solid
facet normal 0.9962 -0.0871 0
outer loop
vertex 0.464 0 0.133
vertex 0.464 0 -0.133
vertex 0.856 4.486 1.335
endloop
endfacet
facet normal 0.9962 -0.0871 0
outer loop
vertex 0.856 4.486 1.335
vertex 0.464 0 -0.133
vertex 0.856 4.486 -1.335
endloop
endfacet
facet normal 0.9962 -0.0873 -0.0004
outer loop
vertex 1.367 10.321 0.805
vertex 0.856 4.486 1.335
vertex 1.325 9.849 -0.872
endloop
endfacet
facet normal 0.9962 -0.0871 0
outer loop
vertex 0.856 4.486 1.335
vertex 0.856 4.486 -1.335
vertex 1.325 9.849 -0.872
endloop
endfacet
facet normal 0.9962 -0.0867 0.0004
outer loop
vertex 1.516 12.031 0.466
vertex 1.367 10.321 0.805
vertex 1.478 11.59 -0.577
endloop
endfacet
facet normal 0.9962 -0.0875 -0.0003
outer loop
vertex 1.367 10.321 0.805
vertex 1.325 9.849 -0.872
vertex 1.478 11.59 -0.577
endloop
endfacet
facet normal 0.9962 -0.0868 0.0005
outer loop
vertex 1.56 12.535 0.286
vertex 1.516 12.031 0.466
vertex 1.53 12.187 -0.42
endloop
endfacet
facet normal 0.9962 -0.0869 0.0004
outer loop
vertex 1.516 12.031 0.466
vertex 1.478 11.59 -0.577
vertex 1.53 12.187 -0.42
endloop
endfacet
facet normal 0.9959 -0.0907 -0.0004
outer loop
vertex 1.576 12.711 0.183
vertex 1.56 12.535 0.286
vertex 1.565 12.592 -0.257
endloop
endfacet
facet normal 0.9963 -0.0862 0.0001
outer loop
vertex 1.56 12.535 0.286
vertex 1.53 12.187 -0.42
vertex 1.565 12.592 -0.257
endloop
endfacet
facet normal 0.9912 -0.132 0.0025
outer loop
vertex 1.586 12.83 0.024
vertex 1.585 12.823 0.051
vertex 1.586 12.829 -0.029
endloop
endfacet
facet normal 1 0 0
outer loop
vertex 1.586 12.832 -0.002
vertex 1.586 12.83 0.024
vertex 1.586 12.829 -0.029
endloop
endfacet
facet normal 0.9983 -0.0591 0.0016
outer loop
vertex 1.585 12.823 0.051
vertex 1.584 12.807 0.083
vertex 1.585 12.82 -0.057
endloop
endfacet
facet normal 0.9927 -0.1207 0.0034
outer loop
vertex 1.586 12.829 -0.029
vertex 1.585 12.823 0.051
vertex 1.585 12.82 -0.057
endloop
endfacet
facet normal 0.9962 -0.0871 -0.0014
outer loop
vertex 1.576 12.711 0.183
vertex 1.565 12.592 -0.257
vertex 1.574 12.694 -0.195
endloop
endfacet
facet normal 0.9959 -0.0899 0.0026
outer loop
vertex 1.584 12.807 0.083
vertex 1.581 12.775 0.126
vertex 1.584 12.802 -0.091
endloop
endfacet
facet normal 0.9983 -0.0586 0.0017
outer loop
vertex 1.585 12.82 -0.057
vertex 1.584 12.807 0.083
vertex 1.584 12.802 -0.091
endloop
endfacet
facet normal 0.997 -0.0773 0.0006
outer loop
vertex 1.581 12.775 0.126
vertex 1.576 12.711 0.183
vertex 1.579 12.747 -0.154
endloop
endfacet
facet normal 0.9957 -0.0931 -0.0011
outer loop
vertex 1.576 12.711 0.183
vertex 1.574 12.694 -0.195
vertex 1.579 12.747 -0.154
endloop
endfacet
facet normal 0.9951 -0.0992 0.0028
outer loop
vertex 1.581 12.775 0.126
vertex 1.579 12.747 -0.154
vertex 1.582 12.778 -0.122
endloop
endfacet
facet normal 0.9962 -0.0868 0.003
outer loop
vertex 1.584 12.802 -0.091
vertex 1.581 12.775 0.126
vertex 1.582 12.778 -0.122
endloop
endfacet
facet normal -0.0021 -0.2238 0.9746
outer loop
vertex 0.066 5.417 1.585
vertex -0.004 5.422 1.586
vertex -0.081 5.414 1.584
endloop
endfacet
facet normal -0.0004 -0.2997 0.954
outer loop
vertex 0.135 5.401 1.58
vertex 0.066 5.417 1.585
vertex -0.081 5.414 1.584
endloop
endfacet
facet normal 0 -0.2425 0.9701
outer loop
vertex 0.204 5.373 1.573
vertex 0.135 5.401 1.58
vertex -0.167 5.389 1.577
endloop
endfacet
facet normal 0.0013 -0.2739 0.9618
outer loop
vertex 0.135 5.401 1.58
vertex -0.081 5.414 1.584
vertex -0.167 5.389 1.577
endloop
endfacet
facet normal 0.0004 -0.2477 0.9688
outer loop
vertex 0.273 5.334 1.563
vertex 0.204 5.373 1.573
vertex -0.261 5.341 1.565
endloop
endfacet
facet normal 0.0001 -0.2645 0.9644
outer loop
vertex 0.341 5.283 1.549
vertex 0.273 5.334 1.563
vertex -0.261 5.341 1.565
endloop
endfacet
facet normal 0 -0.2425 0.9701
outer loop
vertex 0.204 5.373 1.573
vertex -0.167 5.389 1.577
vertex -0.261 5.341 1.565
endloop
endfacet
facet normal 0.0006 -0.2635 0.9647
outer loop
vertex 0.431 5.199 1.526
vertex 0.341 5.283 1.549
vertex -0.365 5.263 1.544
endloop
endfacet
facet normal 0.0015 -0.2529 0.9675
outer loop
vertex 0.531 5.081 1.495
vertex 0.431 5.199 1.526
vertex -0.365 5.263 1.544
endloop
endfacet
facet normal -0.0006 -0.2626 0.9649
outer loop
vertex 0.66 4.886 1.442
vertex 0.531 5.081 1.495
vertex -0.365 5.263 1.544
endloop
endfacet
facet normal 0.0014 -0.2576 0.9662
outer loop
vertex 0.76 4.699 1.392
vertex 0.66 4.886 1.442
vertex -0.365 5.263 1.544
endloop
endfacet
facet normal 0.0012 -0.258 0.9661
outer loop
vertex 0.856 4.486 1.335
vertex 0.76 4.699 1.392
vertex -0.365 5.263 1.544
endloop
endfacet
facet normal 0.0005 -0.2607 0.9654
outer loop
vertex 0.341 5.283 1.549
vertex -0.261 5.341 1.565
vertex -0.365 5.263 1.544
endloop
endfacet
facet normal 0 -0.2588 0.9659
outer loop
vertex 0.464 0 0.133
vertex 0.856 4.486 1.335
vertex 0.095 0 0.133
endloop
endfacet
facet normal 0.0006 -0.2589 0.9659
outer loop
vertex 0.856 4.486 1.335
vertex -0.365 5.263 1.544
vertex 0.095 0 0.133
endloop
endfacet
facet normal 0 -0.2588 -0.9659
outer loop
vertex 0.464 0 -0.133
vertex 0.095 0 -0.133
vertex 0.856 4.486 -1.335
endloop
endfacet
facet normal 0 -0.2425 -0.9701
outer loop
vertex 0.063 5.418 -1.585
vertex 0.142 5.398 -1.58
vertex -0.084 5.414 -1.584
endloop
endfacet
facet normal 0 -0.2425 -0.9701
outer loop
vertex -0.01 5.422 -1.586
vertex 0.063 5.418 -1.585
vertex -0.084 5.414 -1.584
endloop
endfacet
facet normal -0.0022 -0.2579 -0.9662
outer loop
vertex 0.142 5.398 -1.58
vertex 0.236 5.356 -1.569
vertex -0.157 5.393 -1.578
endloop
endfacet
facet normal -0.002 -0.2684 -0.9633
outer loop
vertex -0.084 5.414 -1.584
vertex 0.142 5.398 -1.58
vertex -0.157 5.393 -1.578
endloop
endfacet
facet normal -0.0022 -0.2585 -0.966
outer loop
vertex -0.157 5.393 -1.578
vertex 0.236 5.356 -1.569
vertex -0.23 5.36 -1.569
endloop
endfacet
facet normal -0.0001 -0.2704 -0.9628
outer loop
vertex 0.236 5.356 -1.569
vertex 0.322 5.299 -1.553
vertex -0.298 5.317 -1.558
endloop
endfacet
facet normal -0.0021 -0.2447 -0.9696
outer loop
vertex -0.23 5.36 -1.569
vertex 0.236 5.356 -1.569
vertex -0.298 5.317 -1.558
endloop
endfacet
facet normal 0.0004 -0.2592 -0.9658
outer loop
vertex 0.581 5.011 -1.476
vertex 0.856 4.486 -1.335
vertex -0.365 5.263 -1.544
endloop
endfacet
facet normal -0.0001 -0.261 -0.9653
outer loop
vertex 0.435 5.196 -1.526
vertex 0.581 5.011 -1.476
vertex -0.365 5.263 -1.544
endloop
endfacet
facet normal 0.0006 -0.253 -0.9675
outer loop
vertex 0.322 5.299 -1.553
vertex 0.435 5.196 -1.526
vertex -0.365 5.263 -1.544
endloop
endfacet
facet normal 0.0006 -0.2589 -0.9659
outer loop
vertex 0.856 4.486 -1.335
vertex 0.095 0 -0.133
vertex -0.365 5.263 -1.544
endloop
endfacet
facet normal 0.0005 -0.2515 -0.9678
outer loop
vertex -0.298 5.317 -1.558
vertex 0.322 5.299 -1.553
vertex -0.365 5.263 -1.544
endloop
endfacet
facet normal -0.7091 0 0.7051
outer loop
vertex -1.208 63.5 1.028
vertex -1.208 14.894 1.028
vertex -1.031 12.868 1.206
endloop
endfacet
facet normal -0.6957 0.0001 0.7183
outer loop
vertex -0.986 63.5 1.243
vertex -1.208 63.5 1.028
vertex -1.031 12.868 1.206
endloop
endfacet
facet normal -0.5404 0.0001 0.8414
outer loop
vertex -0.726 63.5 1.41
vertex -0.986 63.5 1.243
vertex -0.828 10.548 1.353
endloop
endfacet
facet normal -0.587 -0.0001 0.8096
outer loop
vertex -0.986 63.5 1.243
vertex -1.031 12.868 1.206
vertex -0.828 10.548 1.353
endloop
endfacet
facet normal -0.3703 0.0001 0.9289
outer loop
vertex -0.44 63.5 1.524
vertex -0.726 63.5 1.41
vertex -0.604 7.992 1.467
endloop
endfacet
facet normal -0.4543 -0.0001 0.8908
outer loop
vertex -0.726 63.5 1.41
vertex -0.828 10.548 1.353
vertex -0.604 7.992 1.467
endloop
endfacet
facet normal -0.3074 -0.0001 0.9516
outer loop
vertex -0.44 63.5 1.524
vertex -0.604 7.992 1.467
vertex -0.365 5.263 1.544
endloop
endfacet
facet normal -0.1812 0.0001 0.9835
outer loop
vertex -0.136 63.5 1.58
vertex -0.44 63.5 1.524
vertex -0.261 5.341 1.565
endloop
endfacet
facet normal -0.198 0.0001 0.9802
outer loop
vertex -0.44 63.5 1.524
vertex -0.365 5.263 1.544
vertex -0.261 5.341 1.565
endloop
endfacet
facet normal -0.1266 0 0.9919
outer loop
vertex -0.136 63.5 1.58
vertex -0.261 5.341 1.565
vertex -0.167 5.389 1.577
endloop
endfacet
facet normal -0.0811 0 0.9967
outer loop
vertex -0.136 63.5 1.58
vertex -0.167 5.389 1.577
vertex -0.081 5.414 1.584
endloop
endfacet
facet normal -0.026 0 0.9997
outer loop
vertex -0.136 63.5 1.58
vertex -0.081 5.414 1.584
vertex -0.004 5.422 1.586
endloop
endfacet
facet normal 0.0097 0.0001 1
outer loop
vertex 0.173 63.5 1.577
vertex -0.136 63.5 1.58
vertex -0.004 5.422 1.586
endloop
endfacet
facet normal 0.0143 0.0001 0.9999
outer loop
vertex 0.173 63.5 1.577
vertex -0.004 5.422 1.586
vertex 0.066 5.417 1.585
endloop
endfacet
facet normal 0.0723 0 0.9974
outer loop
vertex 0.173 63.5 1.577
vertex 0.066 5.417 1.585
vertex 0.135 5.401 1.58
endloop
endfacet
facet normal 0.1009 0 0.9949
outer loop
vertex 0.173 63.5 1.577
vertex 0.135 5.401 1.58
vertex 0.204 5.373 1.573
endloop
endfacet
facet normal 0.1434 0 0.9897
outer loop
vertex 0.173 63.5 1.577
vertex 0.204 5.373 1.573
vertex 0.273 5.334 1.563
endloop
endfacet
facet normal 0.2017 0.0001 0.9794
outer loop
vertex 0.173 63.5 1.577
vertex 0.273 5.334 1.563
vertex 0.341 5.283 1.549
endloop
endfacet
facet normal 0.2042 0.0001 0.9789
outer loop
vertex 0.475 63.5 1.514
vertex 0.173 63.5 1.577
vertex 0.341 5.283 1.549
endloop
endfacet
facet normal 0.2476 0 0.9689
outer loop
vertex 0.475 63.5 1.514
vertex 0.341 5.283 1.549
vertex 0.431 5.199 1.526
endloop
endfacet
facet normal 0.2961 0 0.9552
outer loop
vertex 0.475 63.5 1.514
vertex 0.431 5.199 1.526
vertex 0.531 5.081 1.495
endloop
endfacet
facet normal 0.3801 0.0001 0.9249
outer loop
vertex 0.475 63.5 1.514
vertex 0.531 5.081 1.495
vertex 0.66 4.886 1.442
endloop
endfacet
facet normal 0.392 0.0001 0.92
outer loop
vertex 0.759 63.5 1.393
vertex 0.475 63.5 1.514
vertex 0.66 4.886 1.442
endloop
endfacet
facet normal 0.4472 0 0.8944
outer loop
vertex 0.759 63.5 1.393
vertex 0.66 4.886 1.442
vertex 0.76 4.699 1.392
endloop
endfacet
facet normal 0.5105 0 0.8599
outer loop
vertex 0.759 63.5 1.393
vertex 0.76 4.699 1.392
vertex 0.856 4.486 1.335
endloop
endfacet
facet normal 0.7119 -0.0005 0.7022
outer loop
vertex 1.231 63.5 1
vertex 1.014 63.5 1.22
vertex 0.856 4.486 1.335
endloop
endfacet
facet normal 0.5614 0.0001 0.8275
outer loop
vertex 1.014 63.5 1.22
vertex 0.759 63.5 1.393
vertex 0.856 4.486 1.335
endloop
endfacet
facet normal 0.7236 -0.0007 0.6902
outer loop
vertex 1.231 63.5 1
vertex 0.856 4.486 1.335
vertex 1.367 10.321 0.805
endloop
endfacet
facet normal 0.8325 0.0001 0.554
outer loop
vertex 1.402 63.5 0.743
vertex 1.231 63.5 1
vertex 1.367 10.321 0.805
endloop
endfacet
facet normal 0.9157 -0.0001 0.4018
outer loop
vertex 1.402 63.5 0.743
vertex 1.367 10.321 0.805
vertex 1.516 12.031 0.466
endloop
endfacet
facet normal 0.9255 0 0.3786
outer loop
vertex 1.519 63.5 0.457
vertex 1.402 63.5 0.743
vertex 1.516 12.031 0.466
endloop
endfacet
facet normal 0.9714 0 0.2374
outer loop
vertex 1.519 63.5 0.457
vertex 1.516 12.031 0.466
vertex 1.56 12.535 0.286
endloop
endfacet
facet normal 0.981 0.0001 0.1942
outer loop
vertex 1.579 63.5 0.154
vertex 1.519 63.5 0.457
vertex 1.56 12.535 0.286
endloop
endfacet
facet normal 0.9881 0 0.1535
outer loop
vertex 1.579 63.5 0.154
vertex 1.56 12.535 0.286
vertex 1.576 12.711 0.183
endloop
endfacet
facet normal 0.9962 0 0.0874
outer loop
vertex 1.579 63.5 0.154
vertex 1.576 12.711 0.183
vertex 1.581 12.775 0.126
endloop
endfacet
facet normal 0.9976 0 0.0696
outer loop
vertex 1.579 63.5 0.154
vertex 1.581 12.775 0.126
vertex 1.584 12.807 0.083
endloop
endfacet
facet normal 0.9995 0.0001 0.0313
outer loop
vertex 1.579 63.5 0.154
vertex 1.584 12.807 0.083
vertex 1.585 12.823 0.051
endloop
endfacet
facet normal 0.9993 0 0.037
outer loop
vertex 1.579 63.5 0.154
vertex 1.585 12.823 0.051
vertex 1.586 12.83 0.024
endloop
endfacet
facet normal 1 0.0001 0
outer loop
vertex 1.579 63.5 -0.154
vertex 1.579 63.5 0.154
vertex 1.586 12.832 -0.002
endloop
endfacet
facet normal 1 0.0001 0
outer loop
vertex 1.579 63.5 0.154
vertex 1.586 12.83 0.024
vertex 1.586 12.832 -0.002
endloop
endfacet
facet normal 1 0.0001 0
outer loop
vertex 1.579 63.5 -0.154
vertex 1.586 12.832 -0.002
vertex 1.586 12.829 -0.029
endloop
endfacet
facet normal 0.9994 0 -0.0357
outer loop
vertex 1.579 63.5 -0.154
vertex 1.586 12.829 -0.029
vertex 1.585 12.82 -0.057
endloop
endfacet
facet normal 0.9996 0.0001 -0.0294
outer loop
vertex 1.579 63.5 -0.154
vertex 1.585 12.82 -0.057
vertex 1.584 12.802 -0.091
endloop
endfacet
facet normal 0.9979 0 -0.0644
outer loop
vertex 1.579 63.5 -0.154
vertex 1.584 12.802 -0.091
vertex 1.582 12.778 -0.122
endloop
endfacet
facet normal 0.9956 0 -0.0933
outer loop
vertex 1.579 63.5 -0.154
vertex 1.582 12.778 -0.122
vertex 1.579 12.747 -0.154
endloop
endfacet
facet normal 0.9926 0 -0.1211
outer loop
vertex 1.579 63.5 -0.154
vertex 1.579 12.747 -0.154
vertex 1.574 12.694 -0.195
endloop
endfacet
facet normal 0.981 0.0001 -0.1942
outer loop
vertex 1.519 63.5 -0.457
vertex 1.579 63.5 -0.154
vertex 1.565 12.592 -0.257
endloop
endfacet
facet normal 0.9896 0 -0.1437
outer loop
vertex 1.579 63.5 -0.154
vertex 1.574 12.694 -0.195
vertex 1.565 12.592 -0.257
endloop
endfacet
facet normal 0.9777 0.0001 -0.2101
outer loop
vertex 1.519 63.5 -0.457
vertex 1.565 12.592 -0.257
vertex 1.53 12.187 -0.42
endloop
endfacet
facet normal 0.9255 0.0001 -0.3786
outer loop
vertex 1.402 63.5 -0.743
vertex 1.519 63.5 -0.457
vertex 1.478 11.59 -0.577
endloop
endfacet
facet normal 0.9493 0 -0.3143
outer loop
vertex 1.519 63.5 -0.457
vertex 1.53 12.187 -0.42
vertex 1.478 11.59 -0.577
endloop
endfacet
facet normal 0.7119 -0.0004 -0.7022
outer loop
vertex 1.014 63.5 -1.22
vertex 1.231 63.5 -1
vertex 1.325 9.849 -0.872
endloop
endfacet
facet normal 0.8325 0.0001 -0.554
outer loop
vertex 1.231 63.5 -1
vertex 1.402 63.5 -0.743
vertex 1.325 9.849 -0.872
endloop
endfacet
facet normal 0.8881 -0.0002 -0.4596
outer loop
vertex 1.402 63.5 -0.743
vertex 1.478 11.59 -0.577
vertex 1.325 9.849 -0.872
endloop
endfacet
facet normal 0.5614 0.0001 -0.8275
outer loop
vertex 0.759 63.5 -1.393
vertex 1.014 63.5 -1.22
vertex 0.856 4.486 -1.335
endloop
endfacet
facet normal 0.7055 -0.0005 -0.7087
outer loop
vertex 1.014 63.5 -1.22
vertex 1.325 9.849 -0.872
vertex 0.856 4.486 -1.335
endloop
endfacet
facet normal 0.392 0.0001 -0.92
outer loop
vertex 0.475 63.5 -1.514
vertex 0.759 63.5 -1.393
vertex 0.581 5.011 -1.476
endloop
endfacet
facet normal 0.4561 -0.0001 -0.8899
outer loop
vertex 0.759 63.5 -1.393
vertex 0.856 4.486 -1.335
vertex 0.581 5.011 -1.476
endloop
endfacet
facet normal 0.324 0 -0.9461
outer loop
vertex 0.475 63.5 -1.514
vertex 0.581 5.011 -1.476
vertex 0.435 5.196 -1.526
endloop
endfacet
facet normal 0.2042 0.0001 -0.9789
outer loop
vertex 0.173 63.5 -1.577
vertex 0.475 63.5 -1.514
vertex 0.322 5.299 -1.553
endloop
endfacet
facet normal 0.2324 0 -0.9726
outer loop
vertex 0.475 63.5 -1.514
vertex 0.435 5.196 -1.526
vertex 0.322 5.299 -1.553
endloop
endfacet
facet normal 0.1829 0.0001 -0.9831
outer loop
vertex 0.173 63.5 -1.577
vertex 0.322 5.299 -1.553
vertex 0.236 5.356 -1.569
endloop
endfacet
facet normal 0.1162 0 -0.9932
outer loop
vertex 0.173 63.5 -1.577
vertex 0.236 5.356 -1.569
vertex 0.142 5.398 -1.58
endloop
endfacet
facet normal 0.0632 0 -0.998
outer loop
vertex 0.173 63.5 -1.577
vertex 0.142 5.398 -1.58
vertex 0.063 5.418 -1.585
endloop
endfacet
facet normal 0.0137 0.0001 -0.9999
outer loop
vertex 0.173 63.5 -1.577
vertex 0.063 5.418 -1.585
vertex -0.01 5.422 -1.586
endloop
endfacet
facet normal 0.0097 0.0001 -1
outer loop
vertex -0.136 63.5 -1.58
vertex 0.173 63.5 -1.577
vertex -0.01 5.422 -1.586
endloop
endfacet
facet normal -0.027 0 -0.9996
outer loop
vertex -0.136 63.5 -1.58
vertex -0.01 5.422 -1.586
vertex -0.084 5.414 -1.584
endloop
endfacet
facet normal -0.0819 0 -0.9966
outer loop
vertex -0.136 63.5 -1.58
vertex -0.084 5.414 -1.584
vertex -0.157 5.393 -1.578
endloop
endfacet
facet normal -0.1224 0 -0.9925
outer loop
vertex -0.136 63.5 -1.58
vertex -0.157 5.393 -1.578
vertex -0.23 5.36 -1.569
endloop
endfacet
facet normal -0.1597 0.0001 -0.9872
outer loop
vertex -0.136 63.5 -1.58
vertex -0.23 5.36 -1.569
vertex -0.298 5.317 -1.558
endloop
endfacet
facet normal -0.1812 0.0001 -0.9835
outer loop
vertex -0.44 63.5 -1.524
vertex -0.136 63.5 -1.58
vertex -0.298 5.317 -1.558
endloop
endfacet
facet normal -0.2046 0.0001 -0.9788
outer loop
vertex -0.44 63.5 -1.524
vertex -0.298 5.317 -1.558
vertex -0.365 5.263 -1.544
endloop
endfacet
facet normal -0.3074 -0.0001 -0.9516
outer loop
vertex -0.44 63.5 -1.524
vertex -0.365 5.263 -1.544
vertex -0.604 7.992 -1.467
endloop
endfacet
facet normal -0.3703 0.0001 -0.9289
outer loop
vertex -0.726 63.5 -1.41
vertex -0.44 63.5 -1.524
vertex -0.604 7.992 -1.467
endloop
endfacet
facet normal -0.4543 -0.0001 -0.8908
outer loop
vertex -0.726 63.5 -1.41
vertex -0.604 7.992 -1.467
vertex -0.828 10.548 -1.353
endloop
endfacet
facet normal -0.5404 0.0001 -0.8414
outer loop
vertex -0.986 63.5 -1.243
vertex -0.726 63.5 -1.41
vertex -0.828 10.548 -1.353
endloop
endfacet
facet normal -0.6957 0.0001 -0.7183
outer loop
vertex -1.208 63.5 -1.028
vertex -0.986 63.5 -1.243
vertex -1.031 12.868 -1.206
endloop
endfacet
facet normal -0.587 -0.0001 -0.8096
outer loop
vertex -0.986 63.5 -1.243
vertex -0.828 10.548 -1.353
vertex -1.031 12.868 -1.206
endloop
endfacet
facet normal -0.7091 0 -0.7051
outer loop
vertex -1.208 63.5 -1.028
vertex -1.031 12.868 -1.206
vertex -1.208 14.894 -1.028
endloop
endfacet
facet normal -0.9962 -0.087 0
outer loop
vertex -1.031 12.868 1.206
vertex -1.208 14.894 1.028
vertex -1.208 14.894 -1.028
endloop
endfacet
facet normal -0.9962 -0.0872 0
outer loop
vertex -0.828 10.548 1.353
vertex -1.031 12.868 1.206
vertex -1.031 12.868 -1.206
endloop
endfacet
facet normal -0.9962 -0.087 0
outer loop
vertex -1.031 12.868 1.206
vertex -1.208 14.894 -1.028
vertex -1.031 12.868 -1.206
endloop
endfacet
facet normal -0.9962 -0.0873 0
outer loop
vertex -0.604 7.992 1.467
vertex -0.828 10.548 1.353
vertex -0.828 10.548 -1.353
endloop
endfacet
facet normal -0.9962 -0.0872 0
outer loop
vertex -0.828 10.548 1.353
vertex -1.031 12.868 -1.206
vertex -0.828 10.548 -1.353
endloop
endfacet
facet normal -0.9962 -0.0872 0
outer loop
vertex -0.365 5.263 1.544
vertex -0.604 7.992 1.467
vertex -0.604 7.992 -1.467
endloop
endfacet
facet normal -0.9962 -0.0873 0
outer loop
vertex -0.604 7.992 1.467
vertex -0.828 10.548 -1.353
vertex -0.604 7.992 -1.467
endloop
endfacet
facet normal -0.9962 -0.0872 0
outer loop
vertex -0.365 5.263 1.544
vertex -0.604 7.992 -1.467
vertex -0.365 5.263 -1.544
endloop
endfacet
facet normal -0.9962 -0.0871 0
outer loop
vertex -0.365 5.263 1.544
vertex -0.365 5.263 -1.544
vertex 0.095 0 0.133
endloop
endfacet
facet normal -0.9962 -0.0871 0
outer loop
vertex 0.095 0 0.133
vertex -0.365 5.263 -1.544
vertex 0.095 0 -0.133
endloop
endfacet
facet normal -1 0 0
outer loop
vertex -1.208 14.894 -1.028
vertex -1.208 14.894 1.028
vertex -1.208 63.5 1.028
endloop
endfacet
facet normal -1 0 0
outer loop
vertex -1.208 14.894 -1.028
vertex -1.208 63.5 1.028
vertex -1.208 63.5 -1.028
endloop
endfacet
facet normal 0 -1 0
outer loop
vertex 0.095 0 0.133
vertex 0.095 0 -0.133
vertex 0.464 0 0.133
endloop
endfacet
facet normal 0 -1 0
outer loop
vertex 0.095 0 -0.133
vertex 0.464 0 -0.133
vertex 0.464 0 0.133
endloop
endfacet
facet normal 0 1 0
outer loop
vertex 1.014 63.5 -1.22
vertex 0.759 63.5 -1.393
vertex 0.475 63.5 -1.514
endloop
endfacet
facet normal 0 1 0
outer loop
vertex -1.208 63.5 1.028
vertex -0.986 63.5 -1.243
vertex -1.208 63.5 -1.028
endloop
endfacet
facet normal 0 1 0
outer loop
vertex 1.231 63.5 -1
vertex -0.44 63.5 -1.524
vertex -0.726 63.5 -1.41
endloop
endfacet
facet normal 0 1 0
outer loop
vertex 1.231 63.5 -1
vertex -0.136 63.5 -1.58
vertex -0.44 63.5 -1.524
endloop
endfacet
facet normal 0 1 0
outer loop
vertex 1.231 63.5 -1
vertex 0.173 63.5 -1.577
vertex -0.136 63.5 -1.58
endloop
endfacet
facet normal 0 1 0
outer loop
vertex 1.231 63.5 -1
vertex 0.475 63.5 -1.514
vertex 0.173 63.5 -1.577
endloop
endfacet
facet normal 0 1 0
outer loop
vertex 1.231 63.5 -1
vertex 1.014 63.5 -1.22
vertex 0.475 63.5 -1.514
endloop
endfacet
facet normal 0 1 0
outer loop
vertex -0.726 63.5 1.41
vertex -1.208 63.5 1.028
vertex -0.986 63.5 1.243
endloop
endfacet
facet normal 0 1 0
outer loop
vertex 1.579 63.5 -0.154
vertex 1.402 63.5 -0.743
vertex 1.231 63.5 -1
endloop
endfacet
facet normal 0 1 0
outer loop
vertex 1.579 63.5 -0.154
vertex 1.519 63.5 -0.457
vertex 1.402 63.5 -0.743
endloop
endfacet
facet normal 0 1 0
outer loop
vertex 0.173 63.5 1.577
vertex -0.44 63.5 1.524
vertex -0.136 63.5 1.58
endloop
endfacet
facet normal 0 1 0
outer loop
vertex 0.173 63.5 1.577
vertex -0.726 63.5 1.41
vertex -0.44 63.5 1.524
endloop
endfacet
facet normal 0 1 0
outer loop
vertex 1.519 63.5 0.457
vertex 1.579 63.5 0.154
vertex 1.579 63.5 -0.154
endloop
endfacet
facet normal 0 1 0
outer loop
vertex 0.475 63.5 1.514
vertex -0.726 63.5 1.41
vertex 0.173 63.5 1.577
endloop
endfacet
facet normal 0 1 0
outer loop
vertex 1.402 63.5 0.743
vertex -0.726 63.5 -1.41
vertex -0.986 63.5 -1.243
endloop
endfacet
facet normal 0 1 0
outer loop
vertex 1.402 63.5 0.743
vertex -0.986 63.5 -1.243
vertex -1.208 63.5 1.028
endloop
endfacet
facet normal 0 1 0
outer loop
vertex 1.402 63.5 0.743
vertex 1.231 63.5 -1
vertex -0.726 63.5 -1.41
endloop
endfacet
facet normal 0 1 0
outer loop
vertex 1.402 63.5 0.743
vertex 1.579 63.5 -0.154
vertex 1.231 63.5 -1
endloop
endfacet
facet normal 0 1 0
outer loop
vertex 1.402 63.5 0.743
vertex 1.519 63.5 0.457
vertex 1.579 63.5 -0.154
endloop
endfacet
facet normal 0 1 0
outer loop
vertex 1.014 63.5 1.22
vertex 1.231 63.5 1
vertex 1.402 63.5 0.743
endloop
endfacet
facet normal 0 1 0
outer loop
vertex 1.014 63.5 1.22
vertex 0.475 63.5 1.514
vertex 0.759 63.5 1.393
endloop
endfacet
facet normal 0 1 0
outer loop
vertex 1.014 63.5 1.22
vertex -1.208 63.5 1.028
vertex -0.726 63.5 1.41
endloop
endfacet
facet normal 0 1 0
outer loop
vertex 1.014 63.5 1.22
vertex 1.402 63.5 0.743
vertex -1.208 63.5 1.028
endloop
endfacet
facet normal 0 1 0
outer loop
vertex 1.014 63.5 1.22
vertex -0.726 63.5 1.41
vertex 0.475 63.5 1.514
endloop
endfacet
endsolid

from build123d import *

# Parameters (mm, degrees)
TD_SKETCH_R                  = 1.58623
TL_FEATURE_DEPTH             = 63.5
TDF_SKETCH_W                 = 3.19246
TDF_SKETCH_H                 = 3.19246
TDF_FEATURE_DEPTH            = 64.53961167
ISA_FEATURE_DEPTH            = 64.53961167
ISA_FEATURE_DEPTH_BACK       = 64.53961167
STD_SHANK_FEATURE_DEPTH      = 64.53961167
STD_SHANK_FEATURE_DEPTH_BACK = 64.53961167


with BuildPart() as part:
    # TD_sketch → TL_feature (new body)
    with BuildSketch(Plane(origin=(0, 0, 0), x_dir=(1, 0, 0), z_dir=(0, 1, 0))):
        with Locations(Location((0, 0, 0), (0, 0, 270))):
            Circle(TD_SKETCH_R)
    extrude(amount=TL_FEATURE_DEPTH)

    # TDF_sketch → TDF_feature (cut, through all)
    with BuildSketch(Plane(origin=(0, 0, 0), x_dir=(1, 0, 0), z_dir=(0, 1, 0))):
        with Locations((-2.804, 0)):
            Rectangle(TDF_SKETCH_W, TDF_SKETCH_H)
    extrude(amount=TDF_FEATURE_DEPTH, mode=Mode.SUBTRACT)

    # ISA_sketch → ISA_feature (cut, two sides: drawn at the far end of the back side and taken through both)
    with BuildSketch(Plane(origin=(0, 0, 0), x_dir=(0, 0, -1), z_dir=(1, 0, 0)).offset(-ISA_FEATURE_DEPTH_BACK)):
        Polygon((-54.007028628, 201.05930583), (-17.148123719, 63.5), (-0.13335, 0), (0.13335, 0), (17.148123719, 63.5), (54.007028628, 201.05930583), (54.007028628, -83.764439609), (-54.007028628, -83.764439609), align=None)
    extrude(amount=ISA_FEATURE_DEPTH + ISA_FEATURE_DEPTH_BACK, mode=Mode.SUBTRACT)

    # STD_shank_sketch → STD_shank_feature (cut, two sides: drawn at the far end of the back side and taken through both)
    with BuildSketch(Plane.XY.offset(-STD_SHANK_FEATURE_DEPTH_BACK)):
        Polygon((-17.472069957, 200.795385926), (-5.460280134, 63.5), (0.09525, 0), (0.46355, 0), (6.019080134, 63.5), (18.030869957, 200.795385926), (18.030869957, -74.844278065), (-17.472069957, -74.844278065), align=None)
    extrude(amount=STD_SHANK_FEATURE_DEPTH + STD_SHANK_FEATURE_DEPTH_BACK, mode=Mode.SUBTRACT)


solid = part.part
